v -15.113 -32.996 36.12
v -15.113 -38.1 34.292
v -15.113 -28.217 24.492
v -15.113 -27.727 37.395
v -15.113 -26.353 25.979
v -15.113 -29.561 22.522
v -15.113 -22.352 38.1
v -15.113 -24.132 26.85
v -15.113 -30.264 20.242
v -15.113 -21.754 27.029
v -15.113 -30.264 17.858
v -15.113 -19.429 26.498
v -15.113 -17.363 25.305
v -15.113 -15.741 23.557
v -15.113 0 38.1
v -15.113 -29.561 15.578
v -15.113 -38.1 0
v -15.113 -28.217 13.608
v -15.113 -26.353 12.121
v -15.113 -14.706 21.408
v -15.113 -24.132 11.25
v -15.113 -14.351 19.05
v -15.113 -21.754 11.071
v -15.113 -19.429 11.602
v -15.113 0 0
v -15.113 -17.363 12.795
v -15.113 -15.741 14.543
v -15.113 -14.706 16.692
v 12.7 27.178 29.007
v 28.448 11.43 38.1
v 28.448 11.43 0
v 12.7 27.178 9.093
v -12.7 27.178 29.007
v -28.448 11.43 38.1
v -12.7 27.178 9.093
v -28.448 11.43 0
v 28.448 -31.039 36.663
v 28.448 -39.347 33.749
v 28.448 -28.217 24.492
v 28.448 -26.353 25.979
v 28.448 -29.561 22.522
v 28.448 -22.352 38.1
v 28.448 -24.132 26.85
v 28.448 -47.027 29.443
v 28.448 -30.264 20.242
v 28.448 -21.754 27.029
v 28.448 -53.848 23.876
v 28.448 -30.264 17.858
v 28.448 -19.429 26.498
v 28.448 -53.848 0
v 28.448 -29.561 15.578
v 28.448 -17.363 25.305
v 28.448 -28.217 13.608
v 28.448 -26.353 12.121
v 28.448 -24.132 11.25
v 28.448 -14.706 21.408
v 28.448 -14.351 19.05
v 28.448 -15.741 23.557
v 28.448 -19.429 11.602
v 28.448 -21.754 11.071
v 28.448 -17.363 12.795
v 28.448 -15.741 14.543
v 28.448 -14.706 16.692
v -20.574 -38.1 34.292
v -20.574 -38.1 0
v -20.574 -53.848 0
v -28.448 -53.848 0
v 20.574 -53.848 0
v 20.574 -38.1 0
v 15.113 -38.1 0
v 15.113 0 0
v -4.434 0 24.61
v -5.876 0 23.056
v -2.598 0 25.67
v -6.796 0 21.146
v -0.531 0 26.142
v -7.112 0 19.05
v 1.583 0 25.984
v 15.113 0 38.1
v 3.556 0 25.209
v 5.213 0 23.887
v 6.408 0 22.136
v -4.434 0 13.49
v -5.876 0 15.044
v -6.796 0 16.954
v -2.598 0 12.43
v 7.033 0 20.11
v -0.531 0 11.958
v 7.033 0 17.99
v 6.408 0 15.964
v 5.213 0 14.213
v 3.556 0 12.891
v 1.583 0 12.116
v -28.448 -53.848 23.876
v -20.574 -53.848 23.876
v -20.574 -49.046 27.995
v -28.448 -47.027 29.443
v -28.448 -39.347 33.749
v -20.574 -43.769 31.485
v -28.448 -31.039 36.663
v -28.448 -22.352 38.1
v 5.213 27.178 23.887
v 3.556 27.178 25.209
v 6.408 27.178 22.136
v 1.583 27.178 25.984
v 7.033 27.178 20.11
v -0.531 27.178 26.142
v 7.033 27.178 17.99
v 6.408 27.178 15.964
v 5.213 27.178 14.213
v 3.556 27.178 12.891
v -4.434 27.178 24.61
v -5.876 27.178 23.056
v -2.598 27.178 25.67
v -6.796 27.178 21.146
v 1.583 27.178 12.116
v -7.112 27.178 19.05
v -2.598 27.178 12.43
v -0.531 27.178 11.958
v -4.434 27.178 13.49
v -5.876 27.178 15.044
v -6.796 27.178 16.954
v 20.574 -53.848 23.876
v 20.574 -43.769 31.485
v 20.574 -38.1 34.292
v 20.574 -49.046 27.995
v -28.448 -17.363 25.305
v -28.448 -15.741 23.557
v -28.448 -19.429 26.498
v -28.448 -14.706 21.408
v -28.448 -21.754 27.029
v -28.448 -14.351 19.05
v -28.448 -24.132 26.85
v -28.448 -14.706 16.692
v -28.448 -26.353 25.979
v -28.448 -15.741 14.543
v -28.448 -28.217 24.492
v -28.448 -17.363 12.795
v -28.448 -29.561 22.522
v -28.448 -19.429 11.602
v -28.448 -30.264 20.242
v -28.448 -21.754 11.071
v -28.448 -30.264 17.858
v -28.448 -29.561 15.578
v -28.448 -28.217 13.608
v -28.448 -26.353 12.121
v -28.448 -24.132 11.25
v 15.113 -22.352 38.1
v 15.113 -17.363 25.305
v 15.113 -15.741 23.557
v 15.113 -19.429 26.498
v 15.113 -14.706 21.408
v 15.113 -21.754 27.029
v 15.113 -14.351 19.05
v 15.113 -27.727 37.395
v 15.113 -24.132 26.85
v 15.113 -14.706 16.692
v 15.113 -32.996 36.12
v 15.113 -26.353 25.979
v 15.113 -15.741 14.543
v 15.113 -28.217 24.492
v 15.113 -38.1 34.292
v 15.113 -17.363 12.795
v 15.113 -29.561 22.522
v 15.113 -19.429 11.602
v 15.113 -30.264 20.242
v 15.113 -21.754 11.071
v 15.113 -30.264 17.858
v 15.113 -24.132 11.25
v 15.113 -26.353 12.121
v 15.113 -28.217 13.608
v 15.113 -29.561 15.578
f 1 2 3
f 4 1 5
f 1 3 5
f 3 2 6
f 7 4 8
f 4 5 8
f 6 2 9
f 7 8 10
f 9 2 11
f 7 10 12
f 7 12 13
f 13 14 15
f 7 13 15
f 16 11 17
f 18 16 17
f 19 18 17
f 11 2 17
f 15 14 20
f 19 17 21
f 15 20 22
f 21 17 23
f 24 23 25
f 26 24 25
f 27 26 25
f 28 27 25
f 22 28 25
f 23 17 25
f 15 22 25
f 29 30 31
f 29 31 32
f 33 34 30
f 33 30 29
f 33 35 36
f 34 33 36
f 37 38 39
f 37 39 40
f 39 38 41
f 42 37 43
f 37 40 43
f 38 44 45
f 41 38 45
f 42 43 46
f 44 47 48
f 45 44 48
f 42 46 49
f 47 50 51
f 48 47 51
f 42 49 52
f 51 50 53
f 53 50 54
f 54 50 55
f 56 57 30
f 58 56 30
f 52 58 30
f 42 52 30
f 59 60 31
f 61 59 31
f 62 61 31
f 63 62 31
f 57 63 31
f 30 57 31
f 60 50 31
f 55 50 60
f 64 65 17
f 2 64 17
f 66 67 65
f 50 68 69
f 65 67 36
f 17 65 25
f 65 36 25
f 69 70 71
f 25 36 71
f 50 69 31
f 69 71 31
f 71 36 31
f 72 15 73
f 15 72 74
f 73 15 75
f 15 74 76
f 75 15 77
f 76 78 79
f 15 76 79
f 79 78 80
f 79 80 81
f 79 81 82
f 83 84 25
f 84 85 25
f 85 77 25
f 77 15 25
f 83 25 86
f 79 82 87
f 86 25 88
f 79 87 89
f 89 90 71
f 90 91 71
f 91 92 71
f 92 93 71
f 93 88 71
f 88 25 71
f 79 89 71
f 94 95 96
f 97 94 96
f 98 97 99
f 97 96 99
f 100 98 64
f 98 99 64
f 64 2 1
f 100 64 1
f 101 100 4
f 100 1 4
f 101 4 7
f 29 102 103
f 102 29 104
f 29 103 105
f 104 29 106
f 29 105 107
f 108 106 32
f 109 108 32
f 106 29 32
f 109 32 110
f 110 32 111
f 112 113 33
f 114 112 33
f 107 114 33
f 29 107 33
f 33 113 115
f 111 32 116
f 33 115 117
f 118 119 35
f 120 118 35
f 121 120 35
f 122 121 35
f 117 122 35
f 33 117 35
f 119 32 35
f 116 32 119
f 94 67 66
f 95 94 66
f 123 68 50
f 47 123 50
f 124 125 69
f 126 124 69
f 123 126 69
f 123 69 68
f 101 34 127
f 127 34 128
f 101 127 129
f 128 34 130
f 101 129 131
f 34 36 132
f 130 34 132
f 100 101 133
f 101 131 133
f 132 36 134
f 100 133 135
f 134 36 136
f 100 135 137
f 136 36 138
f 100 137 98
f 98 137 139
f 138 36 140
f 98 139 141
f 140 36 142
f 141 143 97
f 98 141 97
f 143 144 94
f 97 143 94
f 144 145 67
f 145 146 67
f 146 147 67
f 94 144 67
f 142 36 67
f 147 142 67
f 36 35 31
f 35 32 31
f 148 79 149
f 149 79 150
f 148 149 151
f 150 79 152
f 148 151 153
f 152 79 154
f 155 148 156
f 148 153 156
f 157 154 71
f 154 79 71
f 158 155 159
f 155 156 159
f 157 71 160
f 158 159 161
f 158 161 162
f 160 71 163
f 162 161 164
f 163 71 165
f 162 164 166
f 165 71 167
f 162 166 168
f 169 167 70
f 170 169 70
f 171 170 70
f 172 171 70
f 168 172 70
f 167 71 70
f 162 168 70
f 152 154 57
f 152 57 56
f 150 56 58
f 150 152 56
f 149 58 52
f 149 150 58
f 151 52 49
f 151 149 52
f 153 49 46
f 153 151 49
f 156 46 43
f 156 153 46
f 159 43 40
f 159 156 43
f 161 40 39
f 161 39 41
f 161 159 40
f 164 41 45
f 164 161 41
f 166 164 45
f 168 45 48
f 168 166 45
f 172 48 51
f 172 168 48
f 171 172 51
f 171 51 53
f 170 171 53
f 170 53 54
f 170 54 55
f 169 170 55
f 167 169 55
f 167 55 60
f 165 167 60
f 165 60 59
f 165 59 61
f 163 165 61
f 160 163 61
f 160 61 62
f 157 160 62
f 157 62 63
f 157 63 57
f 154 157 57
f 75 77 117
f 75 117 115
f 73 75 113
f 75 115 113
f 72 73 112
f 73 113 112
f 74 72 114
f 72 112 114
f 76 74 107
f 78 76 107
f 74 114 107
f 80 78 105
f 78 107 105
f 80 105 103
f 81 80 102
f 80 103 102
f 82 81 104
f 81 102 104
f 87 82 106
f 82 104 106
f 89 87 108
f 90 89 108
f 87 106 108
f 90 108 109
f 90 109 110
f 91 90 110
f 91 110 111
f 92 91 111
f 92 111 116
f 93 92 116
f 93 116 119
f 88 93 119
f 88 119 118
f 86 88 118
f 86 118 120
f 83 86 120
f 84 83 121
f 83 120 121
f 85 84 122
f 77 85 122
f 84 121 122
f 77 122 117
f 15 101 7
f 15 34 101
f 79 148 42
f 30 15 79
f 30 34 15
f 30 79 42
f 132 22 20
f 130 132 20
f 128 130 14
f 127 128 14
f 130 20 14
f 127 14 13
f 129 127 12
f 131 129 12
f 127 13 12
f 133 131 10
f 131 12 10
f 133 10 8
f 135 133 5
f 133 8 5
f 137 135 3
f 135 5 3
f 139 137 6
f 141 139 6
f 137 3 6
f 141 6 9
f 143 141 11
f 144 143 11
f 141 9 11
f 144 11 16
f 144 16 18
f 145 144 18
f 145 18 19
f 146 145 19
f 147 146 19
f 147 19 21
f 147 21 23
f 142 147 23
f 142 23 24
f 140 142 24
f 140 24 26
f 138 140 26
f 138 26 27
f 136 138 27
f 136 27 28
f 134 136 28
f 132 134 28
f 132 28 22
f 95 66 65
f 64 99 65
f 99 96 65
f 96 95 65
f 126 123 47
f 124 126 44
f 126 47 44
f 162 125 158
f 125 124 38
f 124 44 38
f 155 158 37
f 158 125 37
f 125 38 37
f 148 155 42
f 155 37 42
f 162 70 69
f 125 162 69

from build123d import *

# Parameters (mm, degrees)
F1_DEPTH = 38.1
F3_DEPTH = 28.448
F4_R     = 7.112
F5_DEPTH = 27.178
F6_R     = 8.001
F7_DEPTH = 28.448


with BuildPart() as f1:
    # F0 (on Top) → F1 (new body)
    with BuildSketch(Plane.XY):
        Polygon((-15.113, 0), (0, 0), (15.113, 0), (15.113, -38.1), (20.574, -38.1), (20.574, -53.848), (28.448, -53.848), (28.448, 11.43), (12.7, 27.178), (0, 27.178), (-12.7, 27.178), (-28.448, 11.43), (-28.448, -53.848), (-20.574, -53.848), (-20.574, -38.1), (-15.113, -38.1), align=None)
    extrude(amount=F1_DEPTH)

    # F2 (on Right) → F3 (cut, symmetric)
    with BuildSketch(Plane.YZ):
        Polygon((27.178, 38.1), (11.43, 38.1), (27.178, 29.0068), align=None)
        Polygon((27.178, 9.0932), (11.43, 0), (27.178, 0), align=None)
    extrude(amount=F3_DEPTH, both=True, mode=Mode.SUBTRACT)

    # F4 (on face) → F5 (cut)
    with BuildSketch(Plane(origin=(0, 27.178, 0), x_dir=(-1, 0, 0), z_dir=(0, 1, 0))):
        with Locations((0, 19.05)):
            Circle(F4_R)
    extrude(amount=-F5_DEPTH, mode=Mode.SUBTRACT)

    # F6 (on Right) → F7 (cut, symmetric)
    with BuildSketch(Plane.YZ):
        with Locations((-22.352, 19.05)):
            Circle(F6_R)
        with BuildLine():
            ThreePointArc((-53.848, 23.876), (-39.346733, 33.748623), (-22.352, 38.1))
            Line((-22.352, 38.1), (-53.848, 38.1))
            Line((-53.848, 38.1), (-53.848, 23.876))
        make_face()
    extrude(amount=F7_DEPTH, both=True, mode=Mode.SUBTRACT)


solid = f1.part
